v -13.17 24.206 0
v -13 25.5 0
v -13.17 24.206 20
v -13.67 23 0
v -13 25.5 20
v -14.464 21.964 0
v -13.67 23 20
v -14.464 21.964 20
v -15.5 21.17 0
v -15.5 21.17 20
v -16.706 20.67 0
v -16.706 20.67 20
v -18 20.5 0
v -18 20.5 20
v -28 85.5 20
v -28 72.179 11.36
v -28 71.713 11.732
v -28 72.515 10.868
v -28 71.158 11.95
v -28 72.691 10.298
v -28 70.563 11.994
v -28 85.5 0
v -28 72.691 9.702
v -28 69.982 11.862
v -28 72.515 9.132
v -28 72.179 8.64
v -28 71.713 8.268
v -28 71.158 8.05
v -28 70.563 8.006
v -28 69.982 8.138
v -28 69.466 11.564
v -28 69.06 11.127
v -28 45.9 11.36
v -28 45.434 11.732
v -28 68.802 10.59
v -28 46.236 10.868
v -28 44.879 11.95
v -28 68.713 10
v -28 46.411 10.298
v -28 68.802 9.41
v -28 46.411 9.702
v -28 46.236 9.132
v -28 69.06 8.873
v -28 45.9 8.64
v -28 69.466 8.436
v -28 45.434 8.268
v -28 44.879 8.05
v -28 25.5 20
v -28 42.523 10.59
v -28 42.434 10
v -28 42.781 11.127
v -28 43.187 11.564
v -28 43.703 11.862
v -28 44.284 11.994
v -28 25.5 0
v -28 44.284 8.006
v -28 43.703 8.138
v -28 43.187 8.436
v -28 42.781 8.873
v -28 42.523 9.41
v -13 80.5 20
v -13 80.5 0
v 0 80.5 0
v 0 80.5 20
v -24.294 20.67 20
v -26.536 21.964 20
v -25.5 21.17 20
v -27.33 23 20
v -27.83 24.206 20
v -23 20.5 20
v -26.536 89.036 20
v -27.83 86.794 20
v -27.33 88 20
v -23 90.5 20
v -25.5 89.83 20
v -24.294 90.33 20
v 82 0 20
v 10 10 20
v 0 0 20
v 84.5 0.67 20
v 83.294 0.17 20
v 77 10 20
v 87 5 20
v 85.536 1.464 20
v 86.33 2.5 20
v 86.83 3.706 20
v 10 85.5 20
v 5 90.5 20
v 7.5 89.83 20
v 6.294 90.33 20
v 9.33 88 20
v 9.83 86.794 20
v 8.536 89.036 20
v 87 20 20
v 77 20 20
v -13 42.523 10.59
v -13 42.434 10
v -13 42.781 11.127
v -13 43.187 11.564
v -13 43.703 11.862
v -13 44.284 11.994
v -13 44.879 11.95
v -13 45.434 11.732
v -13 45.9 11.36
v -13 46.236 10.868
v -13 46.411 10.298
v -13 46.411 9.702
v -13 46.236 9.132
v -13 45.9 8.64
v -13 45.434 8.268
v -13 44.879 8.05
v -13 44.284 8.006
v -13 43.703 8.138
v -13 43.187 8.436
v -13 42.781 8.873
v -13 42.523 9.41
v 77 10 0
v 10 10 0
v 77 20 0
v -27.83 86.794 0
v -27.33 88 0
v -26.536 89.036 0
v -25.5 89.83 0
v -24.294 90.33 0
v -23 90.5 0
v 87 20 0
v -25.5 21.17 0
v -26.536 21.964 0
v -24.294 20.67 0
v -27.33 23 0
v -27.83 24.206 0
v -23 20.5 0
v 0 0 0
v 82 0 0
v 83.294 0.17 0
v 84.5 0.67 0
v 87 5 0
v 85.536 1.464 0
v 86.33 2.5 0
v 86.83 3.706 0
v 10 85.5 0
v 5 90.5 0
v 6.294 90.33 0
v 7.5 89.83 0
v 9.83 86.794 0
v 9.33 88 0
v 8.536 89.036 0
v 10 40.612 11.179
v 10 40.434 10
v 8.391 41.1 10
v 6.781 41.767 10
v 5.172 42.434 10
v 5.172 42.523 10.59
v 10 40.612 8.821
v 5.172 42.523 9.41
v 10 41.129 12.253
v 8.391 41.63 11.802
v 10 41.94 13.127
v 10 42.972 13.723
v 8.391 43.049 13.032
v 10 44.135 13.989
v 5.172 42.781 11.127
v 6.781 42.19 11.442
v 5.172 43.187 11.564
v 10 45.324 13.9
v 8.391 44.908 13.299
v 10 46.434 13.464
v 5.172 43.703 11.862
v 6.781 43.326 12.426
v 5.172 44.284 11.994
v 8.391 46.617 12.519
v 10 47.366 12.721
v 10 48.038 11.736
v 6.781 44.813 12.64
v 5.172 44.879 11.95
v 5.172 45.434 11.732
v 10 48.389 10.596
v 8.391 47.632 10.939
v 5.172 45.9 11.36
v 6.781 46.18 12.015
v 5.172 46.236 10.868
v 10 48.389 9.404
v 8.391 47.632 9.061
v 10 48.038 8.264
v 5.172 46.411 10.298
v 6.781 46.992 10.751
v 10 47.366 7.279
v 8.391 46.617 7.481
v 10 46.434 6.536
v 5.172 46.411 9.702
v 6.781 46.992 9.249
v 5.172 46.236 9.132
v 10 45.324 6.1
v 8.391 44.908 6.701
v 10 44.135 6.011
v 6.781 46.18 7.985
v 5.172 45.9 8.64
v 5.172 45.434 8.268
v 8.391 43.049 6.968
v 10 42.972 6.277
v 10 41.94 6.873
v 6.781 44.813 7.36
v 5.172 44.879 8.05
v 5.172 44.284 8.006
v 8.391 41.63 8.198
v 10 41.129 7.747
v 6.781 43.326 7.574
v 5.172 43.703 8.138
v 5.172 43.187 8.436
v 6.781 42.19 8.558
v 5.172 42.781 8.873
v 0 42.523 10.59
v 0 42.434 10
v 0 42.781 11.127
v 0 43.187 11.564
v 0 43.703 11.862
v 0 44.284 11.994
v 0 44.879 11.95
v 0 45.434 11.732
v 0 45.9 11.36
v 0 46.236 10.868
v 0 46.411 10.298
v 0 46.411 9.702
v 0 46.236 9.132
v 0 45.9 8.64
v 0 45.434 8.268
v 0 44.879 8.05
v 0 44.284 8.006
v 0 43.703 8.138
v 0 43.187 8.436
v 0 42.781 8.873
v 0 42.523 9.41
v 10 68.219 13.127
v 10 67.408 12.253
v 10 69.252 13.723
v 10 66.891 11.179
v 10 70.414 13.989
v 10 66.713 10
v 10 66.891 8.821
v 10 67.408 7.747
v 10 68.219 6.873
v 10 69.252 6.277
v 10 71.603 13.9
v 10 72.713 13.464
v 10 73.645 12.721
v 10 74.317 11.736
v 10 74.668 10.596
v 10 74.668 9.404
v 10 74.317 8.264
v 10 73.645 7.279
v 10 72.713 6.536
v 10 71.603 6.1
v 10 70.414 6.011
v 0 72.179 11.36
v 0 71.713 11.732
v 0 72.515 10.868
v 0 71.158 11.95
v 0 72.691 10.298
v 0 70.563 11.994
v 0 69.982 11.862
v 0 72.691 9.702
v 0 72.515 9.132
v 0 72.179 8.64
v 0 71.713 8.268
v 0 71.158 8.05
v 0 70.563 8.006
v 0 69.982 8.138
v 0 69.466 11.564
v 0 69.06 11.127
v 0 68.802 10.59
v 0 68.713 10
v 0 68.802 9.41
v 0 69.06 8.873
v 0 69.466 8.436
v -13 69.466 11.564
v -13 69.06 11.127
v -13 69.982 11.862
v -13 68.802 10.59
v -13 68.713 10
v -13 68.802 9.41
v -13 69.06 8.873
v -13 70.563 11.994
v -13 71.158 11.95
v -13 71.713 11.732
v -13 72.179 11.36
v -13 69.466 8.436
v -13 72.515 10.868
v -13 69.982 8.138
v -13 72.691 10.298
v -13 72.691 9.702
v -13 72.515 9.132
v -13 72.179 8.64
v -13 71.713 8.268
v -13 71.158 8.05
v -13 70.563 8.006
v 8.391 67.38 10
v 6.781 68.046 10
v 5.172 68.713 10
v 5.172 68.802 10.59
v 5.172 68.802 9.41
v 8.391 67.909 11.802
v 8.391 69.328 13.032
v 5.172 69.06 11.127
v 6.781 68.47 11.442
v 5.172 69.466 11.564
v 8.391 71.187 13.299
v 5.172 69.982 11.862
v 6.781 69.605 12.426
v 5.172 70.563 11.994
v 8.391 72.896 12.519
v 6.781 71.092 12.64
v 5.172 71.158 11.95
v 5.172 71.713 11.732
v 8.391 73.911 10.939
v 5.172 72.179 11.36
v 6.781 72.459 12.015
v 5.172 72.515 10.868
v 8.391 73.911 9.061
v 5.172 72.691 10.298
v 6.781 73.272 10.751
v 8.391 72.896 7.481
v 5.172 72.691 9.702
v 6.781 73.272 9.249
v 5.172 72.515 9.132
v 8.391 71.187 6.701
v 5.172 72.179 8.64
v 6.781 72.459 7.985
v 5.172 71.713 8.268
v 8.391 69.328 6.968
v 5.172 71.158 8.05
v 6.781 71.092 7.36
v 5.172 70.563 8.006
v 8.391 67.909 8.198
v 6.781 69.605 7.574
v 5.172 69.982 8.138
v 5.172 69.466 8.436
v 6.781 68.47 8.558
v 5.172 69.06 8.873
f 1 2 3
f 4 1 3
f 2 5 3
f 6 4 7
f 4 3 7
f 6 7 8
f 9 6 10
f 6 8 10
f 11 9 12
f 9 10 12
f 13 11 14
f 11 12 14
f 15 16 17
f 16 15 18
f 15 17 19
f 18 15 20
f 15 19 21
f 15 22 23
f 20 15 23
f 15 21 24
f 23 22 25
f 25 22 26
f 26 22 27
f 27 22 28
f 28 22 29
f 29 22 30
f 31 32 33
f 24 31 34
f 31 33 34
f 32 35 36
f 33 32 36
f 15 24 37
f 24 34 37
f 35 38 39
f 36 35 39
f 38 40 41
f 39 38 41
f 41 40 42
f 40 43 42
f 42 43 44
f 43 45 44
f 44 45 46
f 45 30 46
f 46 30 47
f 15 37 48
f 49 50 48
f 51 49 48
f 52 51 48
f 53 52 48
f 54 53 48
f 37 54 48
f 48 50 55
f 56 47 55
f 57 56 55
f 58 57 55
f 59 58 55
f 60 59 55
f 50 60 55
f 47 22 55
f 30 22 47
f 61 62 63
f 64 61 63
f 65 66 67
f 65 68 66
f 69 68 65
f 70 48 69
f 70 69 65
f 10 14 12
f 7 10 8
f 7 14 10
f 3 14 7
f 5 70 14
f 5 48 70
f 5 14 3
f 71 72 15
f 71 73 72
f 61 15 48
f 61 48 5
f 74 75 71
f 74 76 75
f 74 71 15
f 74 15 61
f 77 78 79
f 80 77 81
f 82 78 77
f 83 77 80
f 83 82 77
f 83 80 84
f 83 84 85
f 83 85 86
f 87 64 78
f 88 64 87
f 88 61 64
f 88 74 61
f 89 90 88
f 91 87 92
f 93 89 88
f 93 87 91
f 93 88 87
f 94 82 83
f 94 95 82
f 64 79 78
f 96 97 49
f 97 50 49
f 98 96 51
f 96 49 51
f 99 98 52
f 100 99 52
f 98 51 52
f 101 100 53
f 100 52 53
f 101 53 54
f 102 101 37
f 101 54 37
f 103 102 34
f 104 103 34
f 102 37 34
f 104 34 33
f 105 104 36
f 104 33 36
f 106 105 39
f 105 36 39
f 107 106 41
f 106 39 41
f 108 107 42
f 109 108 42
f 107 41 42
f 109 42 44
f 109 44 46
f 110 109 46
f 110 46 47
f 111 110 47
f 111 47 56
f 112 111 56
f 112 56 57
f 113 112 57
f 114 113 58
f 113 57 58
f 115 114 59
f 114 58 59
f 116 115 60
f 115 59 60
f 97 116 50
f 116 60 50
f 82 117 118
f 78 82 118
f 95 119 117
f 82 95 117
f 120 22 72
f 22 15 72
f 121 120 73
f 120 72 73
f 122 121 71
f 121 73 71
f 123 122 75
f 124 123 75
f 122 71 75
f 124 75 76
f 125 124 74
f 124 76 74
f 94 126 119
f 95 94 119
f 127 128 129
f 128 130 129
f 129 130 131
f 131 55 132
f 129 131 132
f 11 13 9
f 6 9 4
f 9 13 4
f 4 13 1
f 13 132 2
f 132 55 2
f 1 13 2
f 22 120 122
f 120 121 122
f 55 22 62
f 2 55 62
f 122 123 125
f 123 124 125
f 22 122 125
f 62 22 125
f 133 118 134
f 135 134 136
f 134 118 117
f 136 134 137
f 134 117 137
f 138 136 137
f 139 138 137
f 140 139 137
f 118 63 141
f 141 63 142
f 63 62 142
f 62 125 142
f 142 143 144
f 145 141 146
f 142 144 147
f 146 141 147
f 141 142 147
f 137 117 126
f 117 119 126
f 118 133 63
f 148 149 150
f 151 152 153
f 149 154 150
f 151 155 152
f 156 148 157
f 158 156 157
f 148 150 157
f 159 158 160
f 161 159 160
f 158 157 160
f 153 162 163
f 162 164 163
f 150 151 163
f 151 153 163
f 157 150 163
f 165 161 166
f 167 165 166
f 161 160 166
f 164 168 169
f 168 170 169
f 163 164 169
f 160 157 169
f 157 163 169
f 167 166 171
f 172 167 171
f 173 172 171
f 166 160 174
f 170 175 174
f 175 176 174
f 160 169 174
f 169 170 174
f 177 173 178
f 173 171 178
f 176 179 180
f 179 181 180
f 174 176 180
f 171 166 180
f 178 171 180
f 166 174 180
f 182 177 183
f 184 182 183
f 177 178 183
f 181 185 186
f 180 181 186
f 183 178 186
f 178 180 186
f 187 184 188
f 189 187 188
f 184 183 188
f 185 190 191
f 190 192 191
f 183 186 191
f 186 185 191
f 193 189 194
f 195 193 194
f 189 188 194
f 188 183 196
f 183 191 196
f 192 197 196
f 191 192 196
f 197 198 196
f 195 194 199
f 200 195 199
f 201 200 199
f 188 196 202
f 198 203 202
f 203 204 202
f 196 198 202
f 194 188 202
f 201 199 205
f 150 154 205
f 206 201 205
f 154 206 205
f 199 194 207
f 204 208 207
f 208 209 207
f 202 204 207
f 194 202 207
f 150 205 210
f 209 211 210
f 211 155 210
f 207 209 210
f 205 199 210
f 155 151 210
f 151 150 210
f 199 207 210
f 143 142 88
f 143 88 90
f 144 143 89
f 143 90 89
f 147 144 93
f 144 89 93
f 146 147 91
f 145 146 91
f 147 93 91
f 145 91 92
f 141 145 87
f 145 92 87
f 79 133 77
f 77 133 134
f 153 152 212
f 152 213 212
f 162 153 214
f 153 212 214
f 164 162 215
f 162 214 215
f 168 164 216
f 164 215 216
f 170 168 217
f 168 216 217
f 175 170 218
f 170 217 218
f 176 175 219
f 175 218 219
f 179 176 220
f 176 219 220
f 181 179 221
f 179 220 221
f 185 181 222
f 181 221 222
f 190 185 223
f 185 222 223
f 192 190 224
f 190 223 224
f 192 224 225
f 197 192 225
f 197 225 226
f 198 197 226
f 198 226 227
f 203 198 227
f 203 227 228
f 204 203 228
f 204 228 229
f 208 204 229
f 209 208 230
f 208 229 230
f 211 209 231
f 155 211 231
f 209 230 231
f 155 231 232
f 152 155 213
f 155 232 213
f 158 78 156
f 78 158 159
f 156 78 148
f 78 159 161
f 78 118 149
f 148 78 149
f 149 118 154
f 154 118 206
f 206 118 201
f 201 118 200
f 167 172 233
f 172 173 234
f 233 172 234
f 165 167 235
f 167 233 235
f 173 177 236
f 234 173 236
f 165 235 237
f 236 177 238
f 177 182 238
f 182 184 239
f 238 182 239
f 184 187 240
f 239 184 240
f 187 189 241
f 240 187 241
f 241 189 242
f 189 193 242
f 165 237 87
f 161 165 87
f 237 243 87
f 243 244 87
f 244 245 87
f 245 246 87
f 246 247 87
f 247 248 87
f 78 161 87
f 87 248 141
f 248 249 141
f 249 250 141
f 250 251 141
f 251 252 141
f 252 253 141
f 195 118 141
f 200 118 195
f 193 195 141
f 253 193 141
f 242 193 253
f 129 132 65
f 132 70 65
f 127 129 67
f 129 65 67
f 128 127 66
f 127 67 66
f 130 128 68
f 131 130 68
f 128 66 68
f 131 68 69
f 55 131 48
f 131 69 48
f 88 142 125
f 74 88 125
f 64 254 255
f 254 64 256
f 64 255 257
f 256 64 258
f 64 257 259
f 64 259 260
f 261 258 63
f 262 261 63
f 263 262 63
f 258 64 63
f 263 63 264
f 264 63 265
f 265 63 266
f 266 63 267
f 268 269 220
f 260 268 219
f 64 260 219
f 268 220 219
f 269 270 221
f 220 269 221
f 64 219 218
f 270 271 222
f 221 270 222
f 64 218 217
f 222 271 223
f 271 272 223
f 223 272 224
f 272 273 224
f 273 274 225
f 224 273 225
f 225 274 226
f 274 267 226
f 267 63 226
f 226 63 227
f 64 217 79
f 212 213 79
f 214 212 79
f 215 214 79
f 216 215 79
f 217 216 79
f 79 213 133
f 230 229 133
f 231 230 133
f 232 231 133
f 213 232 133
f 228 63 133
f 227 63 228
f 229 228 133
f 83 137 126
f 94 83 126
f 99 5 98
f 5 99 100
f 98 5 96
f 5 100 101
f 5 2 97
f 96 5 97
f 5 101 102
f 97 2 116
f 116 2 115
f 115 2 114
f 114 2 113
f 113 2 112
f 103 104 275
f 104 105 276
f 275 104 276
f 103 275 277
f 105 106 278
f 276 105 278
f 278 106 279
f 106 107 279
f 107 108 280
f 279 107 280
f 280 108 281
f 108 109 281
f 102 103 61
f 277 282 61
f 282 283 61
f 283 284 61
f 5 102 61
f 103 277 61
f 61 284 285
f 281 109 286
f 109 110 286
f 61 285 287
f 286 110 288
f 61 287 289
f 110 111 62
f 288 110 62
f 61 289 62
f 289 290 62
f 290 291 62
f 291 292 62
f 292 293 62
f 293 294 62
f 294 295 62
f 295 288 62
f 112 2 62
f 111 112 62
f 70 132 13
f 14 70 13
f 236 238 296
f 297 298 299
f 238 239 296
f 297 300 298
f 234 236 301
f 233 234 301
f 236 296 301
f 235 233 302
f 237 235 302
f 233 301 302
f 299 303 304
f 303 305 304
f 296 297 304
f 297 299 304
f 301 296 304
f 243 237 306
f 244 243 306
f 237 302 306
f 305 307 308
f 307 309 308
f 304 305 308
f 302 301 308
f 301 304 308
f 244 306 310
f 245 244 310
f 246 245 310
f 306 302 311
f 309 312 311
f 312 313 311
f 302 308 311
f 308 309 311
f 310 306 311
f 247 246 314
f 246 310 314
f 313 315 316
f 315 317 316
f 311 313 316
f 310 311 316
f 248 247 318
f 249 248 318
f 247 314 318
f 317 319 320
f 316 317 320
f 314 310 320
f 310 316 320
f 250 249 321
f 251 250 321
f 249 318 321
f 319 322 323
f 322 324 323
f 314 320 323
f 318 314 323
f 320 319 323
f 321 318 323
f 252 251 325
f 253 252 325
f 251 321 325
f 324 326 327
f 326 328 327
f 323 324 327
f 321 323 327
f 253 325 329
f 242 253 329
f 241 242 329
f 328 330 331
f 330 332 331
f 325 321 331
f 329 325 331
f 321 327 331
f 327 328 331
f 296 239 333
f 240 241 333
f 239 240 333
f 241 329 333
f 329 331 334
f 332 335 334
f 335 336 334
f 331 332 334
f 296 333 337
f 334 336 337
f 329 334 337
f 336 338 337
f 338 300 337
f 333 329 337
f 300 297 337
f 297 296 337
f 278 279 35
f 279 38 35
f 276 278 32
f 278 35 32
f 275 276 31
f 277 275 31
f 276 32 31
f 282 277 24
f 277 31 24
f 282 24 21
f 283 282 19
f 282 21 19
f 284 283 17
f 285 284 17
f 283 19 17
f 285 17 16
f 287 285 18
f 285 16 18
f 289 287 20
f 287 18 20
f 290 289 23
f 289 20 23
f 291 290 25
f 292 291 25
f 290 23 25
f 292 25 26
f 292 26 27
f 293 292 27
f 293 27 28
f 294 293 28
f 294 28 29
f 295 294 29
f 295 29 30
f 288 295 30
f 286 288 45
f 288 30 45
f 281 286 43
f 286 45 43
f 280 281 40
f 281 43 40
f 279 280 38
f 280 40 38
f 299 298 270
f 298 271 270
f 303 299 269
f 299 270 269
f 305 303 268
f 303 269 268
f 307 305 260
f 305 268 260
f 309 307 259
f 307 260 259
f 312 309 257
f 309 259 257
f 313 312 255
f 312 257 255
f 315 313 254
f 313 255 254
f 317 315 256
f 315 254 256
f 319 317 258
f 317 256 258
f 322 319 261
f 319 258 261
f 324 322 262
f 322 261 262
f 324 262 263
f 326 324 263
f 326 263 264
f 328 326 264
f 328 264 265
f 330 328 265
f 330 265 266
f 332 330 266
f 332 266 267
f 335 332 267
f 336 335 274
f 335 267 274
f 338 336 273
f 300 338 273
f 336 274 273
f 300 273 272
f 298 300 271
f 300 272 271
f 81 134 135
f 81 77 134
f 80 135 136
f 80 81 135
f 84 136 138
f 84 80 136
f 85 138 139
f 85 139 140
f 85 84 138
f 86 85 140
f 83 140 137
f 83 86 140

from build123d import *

# Parameters (mm, degrees)
F1_DEPTH       = 20
F2_R           = 5
F3_R           = 5
F4_R           = 5
F6_D           = 4
F6_CSINK_D     = 8
F6_CSINK_ANGLE = 45


with BuildPart() as f1:
    # F0 (on Top) → F1 (new body)
    with BuildSketch(Plane.XY):
        Polygon((0, 80.5), (0, 0), (87, 0), (87, 20), (77, 20), (77, 10), (10, 10), (10, 90.5), (-28, 90.5), (-28, 20.5), (-13, 20.5), (-13, 80.5), align=None)
    extrude(amount=F1_DEPTH)

    # F2
    f2_edges = [f1.edges().sort_by_distance(p)[0] for p in [
        (87, 0, 10),
    ]]
    fillet(f2_edges, radius=F2_R)

    # F3
    f3_edges = [f1.edges().sort_by_distance(p)[0] for p in [
        (-13, 20.5, 10),
        (-28, 20.5, 10),
    ]]
    fillet(f3_edges, radius=F3_R)

    # F4
    f4_edges = [f1.edges().sort_by_distance(p)[0] for p in [
        (-28, 90.5, 10),
        (10, 90.5, 10),
    ]]
    fillet(f4_edges, radius=F4_R)

    # F6 (through all)
    with Locations(Plane.YZ.offset(10)):
        with Locations((70.712887, 10), (44.433817, 10)):
            CounterSinkHole(F6_D / 2, F6_CSINK_D / 2, counter_sink_angle=F6_CSINK_ANGLE)


solid = f1.part
